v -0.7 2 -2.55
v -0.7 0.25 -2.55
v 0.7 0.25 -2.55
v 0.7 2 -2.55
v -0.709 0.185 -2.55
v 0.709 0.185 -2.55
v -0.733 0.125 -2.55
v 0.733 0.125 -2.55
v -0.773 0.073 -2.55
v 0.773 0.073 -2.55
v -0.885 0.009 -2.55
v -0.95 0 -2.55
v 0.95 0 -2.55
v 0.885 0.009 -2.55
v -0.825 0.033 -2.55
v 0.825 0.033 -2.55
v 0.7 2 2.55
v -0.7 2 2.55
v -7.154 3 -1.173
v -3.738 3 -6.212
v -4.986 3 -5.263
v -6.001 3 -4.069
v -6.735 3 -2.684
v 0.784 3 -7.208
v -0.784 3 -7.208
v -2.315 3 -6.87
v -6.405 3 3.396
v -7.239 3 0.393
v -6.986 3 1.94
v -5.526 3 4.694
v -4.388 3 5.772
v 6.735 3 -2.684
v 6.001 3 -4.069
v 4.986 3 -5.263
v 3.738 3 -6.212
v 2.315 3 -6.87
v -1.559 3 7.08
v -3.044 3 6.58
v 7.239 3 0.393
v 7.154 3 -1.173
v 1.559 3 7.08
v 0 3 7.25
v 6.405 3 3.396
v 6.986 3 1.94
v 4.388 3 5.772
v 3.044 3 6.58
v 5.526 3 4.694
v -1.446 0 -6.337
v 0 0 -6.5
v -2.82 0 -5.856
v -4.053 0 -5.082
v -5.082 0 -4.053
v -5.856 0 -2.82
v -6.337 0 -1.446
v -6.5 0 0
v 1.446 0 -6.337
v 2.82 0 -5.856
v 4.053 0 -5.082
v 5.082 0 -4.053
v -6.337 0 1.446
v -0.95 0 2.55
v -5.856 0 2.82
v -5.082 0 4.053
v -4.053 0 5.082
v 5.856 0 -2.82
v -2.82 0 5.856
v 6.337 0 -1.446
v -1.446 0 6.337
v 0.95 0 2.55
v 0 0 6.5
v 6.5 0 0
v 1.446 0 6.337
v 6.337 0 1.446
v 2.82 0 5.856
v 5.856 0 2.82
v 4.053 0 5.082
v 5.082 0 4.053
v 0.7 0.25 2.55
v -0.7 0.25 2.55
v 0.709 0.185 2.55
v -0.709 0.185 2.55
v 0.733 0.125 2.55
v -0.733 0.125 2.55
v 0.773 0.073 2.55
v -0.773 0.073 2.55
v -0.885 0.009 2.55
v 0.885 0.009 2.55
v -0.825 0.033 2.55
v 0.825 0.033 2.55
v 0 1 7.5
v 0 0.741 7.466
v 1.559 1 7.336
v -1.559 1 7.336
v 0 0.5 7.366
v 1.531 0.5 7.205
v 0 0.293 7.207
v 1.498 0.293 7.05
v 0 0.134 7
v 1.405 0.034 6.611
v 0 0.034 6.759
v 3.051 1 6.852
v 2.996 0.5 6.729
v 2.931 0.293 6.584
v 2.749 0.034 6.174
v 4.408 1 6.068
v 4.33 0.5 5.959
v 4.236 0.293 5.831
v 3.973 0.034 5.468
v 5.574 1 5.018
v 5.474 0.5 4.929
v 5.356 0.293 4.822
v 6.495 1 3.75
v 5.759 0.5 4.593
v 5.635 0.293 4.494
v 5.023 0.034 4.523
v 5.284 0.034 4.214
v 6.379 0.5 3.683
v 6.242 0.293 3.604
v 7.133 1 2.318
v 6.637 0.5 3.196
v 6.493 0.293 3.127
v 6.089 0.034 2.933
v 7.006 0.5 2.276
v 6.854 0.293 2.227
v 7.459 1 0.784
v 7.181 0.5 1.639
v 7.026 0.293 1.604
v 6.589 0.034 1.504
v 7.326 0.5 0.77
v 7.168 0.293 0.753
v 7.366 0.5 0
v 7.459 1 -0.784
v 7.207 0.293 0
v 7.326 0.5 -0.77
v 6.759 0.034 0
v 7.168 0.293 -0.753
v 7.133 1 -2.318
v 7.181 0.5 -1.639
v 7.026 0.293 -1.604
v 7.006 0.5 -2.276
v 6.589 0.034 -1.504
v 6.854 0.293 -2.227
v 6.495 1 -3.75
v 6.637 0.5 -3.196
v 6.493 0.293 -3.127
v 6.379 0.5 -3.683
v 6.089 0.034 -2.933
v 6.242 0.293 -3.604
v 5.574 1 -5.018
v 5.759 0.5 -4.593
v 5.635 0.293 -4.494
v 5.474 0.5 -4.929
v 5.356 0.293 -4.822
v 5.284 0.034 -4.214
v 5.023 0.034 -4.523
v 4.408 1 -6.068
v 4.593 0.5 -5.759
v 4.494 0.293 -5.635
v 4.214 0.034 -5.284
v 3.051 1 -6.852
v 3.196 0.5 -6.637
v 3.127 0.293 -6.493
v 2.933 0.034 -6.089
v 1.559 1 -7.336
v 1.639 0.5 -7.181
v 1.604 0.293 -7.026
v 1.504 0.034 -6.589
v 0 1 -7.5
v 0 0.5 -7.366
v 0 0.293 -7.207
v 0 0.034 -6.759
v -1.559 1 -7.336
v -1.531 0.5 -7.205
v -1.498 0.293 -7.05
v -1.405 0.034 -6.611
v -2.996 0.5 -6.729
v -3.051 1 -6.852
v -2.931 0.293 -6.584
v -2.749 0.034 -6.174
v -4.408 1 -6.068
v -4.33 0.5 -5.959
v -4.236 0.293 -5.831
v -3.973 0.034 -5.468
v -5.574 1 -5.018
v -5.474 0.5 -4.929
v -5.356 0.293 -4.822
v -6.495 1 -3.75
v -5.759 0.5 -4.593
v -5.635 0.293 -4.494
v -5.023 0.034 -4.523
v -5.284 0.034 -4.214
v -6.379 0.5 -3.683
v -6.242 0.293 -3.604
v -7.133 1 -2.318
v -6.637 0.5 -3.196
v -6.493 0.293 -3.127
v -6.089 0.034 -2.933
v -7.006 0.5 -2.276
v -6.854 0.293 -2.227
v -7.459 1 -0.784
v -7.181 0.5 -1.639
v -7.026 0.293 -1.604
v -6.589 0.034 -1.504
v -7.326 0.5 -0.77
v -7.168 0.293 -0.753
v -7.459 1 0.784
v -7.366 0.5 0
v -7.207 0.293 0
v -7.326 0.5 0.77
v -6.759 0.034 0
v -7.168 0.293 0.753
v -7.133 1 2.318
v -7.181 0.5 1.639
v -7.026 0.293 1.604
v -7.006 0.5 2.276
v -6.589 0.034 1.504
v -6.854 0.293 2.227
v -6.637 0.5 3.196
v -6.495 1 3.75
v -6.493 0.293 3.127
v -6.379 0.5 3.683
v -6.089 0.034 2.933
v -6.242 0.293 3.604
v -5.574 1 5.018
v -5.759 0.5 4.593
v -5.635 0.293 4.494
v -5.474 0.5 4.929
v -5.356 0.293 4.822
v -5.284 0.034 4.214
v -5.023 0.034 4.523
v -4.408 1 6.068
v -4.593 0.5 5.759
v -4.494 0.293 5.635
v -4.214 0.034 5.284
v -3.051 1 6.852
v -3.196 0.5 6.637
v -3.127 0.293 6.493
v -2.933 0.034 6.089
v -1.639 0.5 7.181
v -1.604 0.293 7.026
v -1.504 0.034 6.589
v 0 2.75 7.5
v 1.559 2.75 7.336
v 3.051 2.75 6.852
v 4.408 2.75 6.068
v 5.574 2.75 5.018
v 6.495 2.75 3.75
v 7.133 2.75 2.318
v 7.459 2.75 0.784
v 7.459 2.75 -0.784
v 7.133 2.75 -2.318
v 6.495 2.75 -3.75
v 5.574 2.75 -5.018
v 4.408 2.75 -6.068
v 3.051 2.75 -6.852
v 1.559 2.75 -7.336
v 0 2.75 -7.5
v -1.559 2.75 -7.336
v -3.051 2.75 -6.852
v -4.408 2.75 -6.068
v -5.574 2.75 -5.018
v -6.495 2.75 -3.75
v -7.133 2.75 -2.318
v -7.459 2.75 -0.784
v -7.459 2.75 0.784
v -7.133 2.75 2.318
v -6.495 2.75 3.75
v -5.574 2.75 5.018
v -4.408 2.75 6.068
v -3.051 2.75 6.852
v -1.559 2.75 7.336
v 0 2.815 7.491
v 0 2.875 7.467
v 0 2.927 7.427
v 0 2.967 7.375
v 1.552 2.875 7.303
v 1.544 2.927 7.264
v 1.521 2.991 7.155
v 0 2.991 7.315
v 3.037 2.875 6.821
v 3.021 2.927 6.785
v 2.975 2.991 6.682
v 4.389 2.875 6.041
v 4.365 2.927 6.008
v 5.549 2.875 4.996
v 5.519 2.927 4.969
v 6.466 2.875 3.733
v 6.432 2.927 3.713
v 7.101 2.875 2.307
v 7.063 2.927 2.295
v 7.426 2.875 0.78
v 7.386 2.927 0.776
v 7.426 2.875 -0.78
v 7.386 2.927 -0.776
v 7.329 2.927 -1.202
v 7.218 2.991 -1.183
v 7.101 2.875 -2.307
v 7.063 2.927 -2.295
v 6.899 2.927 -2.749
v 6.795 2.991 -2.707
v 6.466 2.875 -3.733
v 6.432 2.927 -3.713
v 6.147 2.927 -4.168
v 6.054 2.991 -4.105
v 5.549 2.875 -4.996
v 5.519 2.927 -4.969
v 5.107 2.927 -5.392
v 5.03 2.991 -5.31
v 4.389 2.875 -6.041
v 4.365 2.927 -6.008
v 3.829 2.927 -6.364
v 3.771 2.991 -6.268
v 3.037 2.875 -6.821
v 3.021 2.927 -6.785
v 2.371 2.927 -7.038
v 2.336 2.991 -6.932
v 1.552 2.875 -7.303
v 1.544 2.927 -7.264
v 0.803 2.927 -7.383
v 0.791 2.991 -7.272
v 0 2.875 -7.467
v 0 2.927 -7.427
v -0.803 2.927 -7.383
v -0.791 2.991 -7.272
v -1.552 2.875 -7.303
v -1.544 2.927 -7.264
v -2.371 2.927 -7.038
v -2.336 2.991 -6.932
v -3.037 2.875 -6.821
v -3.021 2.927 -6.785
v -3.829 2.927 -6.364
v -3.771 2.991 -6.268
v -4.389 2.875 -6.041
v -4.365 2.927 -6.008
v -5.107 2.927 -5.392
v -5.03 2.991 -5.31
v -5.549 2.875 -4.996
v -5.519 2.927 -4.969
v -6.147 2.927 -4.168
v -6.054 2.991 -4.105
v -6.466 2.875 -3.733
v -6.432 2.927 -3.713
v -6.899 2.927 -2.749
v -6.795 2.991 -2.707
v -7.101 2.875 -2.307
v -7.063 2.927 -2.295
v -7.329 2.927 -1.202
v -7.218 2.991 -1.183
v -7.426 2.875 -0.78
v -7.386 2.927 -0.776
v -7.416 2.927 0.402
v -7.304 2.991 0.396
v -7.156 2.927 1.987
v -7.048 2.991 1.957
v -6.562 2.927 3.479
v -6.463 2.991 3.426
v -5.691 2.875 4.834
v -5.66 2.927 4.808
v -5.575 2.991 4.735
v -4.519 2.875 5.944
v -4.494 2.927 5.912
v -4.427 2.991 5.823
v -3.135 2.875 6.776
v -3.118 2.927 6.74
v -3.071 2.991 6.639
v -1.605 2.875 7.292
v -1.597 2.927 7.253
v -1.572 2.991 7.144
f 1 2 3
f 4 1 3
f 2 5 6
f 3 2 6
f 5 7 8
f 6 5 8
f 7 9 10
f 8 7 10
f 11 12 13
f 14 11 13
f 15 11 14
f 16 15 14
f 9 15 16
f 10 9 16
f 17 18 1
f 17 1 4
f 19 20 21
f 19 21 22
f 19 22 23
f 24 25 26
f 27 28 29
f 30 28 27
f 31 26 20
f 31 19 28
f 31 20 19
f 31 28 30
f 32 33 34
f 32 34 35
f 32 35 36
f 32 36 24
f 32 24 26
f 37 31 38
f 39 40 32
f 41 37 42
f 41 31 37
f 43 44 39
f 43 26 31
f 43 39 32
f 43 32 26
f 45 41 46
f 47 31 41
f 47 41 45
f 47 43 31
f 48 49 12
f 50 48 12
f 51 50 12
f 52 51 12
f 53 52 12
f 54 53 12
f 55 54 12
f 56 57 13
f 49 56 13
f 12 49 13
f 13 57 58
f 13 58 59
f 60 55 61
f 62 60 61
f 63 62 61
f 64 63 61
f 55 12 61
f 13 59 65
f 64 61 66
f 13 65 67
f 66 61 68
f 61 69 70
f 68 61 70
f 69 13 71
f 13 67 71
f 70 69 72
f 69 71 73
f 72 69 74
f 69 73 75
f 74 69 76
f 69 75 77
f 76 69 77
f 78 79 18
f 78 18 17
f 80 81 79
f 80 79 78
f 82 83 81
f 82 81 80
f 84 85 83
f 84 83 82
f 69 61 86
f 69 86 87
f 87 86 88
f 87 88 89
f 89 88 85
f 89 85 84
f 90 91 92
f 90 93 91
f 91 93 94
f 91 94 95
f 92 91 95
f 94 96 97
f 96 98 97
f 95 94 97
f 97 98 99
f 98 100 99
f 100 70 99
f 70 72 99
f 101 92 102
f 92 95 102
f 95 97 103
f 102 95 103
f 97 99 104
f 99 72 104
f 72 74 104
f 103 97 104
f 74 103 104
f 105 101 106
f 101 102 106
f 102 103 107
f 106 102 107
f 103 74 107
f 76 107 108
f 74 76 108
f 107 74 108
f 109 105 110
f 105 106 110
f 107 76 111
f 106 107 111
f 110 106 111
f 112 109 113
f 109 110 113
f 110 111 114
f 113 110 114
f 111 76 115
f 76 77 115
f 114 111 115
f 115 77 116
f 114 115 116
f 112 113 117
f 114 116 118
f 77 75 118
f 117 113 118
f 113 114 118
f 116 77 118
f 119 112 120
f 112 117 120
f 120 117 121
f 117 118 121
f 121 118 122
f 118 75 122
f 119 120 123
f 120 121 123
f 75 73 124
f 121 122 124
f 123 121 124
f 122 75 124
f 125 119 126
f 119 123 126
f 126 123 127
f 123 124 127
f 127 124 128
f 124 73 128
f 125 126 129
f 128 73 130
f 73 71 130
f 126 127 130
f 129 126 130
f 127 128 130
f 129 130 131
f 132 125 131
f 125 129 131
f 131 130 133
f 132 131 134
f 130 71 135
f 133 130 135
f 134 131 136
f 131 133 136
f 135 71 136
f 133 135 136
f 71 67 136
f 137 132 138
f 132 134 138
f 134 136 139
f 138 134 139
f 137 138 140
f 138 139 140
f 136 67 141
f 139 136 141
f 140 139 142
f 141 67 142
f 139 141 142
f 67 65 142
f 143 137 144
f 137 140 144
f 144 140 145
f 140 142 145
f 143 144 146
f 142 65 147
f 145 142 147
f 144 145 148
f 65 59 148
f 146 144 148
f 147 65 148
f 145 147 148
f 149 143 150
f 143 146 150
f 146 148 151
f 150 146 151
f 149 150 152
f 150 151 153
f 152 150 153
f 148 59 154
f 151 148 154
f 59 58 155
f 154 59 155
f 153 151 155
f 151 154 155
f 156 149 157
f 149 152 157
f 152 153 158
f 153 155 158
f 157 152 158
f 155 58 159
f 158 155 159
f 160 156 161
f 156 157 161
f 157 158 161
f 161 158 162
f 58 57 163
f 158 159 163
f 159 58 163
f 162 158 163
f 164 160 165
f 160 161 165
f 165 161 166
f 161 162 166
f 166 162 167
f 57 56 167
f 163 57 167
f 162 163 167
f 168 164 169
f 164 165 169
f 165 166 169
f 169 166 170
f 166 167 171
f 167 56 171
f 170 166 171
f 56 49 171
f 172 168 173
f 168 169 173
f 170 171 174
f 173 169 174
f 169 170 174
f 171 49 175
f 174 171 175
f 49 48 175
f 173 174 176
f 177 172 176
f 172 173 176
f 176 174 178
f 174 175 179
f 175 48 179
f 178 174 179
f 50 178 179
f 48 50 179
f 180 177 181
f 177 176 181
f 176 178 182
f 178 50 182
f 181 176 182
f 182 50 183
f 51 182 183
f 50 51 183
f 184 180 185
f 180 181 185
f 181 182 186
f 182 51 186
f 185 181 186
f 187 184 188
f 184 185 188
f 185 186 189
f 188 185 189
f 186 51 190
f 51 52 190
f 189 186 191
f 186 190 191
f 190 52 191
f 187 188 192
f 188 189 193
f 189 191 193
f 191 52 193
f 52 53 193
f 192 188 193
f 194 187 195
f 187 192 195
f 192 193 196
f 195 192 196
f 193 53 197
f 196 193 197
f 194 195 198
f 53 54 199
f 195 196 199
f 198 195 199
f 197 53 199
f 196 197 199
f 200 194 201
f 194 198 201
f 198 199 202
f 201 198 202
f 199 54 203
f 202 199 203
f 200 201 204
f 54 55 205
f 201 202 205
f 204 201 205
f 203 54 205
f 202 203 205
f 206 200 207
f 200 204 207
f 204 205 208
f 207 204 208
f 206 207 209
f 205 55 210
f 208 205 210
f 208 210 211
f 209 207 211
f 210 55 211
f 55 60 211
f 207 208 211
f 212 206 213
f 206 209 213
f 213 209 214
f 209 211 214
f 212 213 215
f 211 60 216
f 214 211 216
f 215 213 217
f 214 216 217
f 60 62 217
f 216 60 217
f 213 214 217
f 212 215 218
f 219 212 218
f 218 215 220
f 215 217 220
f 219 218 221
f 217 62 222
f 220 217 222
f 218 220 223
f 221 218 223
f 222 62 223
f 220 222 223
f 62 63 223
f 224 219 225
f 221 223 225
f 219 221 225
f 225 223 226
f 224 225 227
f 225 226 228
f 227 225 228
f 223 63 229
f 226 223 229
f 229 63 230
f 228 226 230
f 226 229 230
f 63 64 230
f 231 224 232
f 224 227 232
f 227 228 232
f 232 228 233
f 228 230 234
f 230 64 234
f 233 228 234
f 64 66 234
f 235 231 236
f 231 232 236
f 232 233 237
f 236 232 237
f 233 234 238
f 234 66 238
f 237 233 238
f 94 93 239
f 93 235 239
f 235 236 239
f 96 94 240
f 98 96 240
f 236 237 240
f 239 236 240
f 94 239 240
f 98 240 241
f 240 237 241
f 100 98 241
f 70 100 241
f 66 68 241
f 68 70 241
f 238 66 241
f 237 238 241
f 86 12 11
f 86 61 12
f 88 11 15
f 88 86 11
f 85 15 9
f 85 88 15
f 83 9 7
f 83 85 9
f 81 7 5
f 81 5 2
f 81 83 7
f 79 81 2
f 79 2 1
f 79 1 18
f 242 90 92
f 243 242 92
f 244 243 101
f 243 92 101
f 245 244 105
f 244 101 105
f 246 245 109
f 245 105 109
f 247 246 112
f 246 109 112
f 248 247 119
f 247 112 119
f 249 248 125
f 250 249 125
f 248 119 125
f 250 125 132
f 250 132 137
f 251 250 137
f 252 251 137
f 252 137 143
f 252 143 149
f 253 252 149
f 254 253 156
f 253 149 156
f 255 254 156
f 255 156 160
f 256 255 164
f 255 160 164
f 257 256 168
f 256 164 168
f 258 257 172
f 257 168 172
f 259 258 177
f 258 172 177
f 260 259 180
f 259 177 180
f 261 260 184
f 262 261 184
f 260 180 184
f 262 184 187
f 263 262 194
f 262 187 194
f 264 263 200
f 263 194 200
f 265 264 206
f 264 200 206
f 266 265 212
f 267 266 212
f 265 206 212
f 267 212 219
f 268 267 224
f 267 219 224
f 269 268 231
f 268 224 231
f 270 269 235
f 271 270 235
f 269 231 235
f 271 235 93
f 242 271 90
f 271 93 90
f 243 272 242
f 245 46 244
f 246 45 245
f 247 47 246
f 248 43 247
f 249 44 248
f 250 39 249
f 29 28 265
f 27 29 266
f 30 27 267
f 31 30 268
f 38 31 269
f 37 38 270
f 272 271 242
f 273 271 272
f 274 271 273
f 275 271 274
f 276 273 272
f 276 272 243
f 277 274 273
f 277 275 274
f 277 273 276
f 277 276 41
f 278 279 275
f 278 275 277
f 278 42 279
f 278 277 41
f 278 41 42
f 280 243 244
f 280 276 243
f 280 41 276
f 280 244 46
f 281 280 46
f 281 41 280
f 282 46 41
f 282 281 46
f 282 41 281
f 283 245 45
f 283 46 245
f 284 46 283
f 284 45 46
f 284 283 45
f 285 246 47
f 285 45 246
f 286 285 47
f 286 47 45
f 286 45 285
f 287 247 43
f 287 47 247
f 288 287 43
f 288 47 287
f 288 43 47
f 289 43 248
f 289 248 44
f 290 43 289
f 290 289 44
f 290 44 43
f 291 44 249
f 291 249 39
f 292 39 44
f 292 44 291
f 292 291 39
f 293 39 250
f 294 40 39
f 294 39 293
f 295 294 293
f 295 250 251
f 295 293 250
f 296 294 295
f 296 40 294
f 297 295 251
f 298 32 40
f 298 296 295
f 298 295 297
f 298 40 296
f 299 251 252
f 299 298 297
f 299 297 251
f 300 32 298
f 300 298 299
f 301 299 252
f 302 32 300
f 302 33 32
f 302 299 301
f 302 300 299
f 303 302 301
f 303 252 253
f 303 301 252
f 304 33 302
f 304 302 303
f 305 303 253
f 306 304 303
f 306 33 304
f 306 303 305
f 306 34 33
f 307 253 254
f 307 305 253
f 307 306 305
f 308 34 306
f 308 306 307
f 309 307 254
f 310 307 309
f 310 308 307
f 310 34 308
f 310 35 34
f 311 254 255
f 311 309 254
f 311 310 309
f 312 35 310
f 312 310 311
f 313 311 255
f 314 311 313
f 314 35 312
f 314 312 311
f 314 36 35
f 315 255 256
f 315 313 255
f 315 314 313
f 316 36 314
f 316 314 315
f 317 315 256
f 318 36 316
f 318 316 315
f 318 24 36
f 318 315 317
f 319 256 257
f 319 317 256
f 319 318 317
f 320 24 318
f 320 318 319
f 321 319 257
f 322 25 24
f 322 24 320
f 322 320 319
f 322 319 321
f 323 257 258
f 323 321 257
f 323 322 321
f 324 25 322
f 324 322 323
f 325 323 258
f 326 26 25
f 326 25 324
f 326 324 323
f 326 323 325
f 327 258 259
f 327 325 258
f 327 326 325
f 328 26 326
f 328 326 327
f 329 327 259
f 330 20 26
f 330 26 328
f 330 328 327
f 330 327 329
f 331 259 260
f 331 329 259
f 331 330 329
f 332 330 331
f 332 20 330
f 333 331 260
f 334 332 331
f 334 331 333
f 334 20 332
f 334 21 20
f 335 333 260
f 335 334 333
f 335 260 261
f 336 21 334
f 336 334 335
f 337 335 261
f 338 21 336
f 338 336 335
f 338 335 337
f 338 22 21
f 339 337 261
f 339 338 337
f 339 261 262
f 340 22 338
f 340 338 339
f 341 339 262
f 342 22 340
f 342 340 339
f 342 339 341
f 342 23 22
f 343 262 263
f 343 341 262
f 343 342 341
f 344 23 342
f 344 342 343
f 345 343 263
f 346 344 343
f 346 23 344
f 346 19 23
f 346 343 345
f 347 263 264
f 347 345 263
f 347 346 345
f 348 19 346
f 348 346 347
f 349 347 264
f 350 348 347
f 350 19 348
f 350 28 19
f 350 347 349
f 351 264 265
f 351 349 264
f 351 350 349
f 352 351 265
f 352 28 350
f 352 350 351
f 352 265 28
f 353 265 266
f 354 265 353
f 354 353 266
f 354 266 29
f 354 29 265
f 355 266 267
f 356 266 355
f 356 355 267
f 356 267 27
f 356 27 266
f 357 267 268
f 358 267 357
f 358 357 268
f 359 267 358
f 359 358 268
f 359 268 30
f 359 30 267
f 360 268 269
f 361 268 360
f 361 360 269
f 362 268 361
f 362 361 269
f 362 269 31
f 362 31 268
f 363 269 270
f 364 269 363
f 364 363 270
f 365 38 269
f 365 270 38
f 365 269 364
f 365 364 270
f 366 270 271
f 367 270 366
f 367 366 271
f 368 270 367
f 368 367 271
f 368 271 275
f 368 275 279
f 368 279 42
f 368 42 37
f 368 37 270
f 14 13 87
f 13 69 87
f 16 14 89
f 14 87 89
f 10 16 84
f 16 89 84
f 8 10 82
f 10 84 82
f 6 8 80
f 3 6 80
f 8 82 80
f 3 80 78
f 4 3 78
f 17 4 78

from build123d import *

# Parameters (mm, degrees)
SKETCH1_R           = 7.5
BOSS_EXTRUDE1_DEPTH = 3
FILLET1_R           = 1
SKETCH2_W           = 1.4
SKETCH2_H           = 5.1
CUT_EXTRUDE1_DEPTH  = 2
FILLET2_R           = 0.25


with BuildPart() as part:
    # Sketch1 → Boss-Extrude1 (new body)
    with BuildSketch(Plane(origin=(0, 0, 0), x_dir=(1, 0, 0), z_dir=(0, 1, 0))):
        with Locations(Location((0, 0, 0), (0, 0, 270))):  # turned: the seam where the file's is
            Circle(SKETCH1_R)
    extrude(amount=BOSS_EXTRUDE1_DEPTH)

    # Fillet1
    fillet1_edges = [part.edges().sort_by_distance(p)[0] for p in [
        (0, 0, -7.5),
    ]]
    fillet(fillet1_edges, radius=FILLET1_R)

    # Sketch2 → Cut-Extrude1 (cut)
    with BuildSketch(Plane.XZ):
        Rectangle(SKETCH2_W, SKETCH2_H)
    extrude(amount=-CUT_EXTRUDE1_DEPTH, mode=Mode.SUBTRACT)

    # Fillet2
    fillet2_edges = [part.edges().sort_by_distance(p)[0] for p in [
        (-0.7, 0, 0),
        (0.7, 0, 0),
        (0, 3, -7.5),
    ]]
    fillet(fillet2_edges, radius=FILLET2_R)


solid = part.part
